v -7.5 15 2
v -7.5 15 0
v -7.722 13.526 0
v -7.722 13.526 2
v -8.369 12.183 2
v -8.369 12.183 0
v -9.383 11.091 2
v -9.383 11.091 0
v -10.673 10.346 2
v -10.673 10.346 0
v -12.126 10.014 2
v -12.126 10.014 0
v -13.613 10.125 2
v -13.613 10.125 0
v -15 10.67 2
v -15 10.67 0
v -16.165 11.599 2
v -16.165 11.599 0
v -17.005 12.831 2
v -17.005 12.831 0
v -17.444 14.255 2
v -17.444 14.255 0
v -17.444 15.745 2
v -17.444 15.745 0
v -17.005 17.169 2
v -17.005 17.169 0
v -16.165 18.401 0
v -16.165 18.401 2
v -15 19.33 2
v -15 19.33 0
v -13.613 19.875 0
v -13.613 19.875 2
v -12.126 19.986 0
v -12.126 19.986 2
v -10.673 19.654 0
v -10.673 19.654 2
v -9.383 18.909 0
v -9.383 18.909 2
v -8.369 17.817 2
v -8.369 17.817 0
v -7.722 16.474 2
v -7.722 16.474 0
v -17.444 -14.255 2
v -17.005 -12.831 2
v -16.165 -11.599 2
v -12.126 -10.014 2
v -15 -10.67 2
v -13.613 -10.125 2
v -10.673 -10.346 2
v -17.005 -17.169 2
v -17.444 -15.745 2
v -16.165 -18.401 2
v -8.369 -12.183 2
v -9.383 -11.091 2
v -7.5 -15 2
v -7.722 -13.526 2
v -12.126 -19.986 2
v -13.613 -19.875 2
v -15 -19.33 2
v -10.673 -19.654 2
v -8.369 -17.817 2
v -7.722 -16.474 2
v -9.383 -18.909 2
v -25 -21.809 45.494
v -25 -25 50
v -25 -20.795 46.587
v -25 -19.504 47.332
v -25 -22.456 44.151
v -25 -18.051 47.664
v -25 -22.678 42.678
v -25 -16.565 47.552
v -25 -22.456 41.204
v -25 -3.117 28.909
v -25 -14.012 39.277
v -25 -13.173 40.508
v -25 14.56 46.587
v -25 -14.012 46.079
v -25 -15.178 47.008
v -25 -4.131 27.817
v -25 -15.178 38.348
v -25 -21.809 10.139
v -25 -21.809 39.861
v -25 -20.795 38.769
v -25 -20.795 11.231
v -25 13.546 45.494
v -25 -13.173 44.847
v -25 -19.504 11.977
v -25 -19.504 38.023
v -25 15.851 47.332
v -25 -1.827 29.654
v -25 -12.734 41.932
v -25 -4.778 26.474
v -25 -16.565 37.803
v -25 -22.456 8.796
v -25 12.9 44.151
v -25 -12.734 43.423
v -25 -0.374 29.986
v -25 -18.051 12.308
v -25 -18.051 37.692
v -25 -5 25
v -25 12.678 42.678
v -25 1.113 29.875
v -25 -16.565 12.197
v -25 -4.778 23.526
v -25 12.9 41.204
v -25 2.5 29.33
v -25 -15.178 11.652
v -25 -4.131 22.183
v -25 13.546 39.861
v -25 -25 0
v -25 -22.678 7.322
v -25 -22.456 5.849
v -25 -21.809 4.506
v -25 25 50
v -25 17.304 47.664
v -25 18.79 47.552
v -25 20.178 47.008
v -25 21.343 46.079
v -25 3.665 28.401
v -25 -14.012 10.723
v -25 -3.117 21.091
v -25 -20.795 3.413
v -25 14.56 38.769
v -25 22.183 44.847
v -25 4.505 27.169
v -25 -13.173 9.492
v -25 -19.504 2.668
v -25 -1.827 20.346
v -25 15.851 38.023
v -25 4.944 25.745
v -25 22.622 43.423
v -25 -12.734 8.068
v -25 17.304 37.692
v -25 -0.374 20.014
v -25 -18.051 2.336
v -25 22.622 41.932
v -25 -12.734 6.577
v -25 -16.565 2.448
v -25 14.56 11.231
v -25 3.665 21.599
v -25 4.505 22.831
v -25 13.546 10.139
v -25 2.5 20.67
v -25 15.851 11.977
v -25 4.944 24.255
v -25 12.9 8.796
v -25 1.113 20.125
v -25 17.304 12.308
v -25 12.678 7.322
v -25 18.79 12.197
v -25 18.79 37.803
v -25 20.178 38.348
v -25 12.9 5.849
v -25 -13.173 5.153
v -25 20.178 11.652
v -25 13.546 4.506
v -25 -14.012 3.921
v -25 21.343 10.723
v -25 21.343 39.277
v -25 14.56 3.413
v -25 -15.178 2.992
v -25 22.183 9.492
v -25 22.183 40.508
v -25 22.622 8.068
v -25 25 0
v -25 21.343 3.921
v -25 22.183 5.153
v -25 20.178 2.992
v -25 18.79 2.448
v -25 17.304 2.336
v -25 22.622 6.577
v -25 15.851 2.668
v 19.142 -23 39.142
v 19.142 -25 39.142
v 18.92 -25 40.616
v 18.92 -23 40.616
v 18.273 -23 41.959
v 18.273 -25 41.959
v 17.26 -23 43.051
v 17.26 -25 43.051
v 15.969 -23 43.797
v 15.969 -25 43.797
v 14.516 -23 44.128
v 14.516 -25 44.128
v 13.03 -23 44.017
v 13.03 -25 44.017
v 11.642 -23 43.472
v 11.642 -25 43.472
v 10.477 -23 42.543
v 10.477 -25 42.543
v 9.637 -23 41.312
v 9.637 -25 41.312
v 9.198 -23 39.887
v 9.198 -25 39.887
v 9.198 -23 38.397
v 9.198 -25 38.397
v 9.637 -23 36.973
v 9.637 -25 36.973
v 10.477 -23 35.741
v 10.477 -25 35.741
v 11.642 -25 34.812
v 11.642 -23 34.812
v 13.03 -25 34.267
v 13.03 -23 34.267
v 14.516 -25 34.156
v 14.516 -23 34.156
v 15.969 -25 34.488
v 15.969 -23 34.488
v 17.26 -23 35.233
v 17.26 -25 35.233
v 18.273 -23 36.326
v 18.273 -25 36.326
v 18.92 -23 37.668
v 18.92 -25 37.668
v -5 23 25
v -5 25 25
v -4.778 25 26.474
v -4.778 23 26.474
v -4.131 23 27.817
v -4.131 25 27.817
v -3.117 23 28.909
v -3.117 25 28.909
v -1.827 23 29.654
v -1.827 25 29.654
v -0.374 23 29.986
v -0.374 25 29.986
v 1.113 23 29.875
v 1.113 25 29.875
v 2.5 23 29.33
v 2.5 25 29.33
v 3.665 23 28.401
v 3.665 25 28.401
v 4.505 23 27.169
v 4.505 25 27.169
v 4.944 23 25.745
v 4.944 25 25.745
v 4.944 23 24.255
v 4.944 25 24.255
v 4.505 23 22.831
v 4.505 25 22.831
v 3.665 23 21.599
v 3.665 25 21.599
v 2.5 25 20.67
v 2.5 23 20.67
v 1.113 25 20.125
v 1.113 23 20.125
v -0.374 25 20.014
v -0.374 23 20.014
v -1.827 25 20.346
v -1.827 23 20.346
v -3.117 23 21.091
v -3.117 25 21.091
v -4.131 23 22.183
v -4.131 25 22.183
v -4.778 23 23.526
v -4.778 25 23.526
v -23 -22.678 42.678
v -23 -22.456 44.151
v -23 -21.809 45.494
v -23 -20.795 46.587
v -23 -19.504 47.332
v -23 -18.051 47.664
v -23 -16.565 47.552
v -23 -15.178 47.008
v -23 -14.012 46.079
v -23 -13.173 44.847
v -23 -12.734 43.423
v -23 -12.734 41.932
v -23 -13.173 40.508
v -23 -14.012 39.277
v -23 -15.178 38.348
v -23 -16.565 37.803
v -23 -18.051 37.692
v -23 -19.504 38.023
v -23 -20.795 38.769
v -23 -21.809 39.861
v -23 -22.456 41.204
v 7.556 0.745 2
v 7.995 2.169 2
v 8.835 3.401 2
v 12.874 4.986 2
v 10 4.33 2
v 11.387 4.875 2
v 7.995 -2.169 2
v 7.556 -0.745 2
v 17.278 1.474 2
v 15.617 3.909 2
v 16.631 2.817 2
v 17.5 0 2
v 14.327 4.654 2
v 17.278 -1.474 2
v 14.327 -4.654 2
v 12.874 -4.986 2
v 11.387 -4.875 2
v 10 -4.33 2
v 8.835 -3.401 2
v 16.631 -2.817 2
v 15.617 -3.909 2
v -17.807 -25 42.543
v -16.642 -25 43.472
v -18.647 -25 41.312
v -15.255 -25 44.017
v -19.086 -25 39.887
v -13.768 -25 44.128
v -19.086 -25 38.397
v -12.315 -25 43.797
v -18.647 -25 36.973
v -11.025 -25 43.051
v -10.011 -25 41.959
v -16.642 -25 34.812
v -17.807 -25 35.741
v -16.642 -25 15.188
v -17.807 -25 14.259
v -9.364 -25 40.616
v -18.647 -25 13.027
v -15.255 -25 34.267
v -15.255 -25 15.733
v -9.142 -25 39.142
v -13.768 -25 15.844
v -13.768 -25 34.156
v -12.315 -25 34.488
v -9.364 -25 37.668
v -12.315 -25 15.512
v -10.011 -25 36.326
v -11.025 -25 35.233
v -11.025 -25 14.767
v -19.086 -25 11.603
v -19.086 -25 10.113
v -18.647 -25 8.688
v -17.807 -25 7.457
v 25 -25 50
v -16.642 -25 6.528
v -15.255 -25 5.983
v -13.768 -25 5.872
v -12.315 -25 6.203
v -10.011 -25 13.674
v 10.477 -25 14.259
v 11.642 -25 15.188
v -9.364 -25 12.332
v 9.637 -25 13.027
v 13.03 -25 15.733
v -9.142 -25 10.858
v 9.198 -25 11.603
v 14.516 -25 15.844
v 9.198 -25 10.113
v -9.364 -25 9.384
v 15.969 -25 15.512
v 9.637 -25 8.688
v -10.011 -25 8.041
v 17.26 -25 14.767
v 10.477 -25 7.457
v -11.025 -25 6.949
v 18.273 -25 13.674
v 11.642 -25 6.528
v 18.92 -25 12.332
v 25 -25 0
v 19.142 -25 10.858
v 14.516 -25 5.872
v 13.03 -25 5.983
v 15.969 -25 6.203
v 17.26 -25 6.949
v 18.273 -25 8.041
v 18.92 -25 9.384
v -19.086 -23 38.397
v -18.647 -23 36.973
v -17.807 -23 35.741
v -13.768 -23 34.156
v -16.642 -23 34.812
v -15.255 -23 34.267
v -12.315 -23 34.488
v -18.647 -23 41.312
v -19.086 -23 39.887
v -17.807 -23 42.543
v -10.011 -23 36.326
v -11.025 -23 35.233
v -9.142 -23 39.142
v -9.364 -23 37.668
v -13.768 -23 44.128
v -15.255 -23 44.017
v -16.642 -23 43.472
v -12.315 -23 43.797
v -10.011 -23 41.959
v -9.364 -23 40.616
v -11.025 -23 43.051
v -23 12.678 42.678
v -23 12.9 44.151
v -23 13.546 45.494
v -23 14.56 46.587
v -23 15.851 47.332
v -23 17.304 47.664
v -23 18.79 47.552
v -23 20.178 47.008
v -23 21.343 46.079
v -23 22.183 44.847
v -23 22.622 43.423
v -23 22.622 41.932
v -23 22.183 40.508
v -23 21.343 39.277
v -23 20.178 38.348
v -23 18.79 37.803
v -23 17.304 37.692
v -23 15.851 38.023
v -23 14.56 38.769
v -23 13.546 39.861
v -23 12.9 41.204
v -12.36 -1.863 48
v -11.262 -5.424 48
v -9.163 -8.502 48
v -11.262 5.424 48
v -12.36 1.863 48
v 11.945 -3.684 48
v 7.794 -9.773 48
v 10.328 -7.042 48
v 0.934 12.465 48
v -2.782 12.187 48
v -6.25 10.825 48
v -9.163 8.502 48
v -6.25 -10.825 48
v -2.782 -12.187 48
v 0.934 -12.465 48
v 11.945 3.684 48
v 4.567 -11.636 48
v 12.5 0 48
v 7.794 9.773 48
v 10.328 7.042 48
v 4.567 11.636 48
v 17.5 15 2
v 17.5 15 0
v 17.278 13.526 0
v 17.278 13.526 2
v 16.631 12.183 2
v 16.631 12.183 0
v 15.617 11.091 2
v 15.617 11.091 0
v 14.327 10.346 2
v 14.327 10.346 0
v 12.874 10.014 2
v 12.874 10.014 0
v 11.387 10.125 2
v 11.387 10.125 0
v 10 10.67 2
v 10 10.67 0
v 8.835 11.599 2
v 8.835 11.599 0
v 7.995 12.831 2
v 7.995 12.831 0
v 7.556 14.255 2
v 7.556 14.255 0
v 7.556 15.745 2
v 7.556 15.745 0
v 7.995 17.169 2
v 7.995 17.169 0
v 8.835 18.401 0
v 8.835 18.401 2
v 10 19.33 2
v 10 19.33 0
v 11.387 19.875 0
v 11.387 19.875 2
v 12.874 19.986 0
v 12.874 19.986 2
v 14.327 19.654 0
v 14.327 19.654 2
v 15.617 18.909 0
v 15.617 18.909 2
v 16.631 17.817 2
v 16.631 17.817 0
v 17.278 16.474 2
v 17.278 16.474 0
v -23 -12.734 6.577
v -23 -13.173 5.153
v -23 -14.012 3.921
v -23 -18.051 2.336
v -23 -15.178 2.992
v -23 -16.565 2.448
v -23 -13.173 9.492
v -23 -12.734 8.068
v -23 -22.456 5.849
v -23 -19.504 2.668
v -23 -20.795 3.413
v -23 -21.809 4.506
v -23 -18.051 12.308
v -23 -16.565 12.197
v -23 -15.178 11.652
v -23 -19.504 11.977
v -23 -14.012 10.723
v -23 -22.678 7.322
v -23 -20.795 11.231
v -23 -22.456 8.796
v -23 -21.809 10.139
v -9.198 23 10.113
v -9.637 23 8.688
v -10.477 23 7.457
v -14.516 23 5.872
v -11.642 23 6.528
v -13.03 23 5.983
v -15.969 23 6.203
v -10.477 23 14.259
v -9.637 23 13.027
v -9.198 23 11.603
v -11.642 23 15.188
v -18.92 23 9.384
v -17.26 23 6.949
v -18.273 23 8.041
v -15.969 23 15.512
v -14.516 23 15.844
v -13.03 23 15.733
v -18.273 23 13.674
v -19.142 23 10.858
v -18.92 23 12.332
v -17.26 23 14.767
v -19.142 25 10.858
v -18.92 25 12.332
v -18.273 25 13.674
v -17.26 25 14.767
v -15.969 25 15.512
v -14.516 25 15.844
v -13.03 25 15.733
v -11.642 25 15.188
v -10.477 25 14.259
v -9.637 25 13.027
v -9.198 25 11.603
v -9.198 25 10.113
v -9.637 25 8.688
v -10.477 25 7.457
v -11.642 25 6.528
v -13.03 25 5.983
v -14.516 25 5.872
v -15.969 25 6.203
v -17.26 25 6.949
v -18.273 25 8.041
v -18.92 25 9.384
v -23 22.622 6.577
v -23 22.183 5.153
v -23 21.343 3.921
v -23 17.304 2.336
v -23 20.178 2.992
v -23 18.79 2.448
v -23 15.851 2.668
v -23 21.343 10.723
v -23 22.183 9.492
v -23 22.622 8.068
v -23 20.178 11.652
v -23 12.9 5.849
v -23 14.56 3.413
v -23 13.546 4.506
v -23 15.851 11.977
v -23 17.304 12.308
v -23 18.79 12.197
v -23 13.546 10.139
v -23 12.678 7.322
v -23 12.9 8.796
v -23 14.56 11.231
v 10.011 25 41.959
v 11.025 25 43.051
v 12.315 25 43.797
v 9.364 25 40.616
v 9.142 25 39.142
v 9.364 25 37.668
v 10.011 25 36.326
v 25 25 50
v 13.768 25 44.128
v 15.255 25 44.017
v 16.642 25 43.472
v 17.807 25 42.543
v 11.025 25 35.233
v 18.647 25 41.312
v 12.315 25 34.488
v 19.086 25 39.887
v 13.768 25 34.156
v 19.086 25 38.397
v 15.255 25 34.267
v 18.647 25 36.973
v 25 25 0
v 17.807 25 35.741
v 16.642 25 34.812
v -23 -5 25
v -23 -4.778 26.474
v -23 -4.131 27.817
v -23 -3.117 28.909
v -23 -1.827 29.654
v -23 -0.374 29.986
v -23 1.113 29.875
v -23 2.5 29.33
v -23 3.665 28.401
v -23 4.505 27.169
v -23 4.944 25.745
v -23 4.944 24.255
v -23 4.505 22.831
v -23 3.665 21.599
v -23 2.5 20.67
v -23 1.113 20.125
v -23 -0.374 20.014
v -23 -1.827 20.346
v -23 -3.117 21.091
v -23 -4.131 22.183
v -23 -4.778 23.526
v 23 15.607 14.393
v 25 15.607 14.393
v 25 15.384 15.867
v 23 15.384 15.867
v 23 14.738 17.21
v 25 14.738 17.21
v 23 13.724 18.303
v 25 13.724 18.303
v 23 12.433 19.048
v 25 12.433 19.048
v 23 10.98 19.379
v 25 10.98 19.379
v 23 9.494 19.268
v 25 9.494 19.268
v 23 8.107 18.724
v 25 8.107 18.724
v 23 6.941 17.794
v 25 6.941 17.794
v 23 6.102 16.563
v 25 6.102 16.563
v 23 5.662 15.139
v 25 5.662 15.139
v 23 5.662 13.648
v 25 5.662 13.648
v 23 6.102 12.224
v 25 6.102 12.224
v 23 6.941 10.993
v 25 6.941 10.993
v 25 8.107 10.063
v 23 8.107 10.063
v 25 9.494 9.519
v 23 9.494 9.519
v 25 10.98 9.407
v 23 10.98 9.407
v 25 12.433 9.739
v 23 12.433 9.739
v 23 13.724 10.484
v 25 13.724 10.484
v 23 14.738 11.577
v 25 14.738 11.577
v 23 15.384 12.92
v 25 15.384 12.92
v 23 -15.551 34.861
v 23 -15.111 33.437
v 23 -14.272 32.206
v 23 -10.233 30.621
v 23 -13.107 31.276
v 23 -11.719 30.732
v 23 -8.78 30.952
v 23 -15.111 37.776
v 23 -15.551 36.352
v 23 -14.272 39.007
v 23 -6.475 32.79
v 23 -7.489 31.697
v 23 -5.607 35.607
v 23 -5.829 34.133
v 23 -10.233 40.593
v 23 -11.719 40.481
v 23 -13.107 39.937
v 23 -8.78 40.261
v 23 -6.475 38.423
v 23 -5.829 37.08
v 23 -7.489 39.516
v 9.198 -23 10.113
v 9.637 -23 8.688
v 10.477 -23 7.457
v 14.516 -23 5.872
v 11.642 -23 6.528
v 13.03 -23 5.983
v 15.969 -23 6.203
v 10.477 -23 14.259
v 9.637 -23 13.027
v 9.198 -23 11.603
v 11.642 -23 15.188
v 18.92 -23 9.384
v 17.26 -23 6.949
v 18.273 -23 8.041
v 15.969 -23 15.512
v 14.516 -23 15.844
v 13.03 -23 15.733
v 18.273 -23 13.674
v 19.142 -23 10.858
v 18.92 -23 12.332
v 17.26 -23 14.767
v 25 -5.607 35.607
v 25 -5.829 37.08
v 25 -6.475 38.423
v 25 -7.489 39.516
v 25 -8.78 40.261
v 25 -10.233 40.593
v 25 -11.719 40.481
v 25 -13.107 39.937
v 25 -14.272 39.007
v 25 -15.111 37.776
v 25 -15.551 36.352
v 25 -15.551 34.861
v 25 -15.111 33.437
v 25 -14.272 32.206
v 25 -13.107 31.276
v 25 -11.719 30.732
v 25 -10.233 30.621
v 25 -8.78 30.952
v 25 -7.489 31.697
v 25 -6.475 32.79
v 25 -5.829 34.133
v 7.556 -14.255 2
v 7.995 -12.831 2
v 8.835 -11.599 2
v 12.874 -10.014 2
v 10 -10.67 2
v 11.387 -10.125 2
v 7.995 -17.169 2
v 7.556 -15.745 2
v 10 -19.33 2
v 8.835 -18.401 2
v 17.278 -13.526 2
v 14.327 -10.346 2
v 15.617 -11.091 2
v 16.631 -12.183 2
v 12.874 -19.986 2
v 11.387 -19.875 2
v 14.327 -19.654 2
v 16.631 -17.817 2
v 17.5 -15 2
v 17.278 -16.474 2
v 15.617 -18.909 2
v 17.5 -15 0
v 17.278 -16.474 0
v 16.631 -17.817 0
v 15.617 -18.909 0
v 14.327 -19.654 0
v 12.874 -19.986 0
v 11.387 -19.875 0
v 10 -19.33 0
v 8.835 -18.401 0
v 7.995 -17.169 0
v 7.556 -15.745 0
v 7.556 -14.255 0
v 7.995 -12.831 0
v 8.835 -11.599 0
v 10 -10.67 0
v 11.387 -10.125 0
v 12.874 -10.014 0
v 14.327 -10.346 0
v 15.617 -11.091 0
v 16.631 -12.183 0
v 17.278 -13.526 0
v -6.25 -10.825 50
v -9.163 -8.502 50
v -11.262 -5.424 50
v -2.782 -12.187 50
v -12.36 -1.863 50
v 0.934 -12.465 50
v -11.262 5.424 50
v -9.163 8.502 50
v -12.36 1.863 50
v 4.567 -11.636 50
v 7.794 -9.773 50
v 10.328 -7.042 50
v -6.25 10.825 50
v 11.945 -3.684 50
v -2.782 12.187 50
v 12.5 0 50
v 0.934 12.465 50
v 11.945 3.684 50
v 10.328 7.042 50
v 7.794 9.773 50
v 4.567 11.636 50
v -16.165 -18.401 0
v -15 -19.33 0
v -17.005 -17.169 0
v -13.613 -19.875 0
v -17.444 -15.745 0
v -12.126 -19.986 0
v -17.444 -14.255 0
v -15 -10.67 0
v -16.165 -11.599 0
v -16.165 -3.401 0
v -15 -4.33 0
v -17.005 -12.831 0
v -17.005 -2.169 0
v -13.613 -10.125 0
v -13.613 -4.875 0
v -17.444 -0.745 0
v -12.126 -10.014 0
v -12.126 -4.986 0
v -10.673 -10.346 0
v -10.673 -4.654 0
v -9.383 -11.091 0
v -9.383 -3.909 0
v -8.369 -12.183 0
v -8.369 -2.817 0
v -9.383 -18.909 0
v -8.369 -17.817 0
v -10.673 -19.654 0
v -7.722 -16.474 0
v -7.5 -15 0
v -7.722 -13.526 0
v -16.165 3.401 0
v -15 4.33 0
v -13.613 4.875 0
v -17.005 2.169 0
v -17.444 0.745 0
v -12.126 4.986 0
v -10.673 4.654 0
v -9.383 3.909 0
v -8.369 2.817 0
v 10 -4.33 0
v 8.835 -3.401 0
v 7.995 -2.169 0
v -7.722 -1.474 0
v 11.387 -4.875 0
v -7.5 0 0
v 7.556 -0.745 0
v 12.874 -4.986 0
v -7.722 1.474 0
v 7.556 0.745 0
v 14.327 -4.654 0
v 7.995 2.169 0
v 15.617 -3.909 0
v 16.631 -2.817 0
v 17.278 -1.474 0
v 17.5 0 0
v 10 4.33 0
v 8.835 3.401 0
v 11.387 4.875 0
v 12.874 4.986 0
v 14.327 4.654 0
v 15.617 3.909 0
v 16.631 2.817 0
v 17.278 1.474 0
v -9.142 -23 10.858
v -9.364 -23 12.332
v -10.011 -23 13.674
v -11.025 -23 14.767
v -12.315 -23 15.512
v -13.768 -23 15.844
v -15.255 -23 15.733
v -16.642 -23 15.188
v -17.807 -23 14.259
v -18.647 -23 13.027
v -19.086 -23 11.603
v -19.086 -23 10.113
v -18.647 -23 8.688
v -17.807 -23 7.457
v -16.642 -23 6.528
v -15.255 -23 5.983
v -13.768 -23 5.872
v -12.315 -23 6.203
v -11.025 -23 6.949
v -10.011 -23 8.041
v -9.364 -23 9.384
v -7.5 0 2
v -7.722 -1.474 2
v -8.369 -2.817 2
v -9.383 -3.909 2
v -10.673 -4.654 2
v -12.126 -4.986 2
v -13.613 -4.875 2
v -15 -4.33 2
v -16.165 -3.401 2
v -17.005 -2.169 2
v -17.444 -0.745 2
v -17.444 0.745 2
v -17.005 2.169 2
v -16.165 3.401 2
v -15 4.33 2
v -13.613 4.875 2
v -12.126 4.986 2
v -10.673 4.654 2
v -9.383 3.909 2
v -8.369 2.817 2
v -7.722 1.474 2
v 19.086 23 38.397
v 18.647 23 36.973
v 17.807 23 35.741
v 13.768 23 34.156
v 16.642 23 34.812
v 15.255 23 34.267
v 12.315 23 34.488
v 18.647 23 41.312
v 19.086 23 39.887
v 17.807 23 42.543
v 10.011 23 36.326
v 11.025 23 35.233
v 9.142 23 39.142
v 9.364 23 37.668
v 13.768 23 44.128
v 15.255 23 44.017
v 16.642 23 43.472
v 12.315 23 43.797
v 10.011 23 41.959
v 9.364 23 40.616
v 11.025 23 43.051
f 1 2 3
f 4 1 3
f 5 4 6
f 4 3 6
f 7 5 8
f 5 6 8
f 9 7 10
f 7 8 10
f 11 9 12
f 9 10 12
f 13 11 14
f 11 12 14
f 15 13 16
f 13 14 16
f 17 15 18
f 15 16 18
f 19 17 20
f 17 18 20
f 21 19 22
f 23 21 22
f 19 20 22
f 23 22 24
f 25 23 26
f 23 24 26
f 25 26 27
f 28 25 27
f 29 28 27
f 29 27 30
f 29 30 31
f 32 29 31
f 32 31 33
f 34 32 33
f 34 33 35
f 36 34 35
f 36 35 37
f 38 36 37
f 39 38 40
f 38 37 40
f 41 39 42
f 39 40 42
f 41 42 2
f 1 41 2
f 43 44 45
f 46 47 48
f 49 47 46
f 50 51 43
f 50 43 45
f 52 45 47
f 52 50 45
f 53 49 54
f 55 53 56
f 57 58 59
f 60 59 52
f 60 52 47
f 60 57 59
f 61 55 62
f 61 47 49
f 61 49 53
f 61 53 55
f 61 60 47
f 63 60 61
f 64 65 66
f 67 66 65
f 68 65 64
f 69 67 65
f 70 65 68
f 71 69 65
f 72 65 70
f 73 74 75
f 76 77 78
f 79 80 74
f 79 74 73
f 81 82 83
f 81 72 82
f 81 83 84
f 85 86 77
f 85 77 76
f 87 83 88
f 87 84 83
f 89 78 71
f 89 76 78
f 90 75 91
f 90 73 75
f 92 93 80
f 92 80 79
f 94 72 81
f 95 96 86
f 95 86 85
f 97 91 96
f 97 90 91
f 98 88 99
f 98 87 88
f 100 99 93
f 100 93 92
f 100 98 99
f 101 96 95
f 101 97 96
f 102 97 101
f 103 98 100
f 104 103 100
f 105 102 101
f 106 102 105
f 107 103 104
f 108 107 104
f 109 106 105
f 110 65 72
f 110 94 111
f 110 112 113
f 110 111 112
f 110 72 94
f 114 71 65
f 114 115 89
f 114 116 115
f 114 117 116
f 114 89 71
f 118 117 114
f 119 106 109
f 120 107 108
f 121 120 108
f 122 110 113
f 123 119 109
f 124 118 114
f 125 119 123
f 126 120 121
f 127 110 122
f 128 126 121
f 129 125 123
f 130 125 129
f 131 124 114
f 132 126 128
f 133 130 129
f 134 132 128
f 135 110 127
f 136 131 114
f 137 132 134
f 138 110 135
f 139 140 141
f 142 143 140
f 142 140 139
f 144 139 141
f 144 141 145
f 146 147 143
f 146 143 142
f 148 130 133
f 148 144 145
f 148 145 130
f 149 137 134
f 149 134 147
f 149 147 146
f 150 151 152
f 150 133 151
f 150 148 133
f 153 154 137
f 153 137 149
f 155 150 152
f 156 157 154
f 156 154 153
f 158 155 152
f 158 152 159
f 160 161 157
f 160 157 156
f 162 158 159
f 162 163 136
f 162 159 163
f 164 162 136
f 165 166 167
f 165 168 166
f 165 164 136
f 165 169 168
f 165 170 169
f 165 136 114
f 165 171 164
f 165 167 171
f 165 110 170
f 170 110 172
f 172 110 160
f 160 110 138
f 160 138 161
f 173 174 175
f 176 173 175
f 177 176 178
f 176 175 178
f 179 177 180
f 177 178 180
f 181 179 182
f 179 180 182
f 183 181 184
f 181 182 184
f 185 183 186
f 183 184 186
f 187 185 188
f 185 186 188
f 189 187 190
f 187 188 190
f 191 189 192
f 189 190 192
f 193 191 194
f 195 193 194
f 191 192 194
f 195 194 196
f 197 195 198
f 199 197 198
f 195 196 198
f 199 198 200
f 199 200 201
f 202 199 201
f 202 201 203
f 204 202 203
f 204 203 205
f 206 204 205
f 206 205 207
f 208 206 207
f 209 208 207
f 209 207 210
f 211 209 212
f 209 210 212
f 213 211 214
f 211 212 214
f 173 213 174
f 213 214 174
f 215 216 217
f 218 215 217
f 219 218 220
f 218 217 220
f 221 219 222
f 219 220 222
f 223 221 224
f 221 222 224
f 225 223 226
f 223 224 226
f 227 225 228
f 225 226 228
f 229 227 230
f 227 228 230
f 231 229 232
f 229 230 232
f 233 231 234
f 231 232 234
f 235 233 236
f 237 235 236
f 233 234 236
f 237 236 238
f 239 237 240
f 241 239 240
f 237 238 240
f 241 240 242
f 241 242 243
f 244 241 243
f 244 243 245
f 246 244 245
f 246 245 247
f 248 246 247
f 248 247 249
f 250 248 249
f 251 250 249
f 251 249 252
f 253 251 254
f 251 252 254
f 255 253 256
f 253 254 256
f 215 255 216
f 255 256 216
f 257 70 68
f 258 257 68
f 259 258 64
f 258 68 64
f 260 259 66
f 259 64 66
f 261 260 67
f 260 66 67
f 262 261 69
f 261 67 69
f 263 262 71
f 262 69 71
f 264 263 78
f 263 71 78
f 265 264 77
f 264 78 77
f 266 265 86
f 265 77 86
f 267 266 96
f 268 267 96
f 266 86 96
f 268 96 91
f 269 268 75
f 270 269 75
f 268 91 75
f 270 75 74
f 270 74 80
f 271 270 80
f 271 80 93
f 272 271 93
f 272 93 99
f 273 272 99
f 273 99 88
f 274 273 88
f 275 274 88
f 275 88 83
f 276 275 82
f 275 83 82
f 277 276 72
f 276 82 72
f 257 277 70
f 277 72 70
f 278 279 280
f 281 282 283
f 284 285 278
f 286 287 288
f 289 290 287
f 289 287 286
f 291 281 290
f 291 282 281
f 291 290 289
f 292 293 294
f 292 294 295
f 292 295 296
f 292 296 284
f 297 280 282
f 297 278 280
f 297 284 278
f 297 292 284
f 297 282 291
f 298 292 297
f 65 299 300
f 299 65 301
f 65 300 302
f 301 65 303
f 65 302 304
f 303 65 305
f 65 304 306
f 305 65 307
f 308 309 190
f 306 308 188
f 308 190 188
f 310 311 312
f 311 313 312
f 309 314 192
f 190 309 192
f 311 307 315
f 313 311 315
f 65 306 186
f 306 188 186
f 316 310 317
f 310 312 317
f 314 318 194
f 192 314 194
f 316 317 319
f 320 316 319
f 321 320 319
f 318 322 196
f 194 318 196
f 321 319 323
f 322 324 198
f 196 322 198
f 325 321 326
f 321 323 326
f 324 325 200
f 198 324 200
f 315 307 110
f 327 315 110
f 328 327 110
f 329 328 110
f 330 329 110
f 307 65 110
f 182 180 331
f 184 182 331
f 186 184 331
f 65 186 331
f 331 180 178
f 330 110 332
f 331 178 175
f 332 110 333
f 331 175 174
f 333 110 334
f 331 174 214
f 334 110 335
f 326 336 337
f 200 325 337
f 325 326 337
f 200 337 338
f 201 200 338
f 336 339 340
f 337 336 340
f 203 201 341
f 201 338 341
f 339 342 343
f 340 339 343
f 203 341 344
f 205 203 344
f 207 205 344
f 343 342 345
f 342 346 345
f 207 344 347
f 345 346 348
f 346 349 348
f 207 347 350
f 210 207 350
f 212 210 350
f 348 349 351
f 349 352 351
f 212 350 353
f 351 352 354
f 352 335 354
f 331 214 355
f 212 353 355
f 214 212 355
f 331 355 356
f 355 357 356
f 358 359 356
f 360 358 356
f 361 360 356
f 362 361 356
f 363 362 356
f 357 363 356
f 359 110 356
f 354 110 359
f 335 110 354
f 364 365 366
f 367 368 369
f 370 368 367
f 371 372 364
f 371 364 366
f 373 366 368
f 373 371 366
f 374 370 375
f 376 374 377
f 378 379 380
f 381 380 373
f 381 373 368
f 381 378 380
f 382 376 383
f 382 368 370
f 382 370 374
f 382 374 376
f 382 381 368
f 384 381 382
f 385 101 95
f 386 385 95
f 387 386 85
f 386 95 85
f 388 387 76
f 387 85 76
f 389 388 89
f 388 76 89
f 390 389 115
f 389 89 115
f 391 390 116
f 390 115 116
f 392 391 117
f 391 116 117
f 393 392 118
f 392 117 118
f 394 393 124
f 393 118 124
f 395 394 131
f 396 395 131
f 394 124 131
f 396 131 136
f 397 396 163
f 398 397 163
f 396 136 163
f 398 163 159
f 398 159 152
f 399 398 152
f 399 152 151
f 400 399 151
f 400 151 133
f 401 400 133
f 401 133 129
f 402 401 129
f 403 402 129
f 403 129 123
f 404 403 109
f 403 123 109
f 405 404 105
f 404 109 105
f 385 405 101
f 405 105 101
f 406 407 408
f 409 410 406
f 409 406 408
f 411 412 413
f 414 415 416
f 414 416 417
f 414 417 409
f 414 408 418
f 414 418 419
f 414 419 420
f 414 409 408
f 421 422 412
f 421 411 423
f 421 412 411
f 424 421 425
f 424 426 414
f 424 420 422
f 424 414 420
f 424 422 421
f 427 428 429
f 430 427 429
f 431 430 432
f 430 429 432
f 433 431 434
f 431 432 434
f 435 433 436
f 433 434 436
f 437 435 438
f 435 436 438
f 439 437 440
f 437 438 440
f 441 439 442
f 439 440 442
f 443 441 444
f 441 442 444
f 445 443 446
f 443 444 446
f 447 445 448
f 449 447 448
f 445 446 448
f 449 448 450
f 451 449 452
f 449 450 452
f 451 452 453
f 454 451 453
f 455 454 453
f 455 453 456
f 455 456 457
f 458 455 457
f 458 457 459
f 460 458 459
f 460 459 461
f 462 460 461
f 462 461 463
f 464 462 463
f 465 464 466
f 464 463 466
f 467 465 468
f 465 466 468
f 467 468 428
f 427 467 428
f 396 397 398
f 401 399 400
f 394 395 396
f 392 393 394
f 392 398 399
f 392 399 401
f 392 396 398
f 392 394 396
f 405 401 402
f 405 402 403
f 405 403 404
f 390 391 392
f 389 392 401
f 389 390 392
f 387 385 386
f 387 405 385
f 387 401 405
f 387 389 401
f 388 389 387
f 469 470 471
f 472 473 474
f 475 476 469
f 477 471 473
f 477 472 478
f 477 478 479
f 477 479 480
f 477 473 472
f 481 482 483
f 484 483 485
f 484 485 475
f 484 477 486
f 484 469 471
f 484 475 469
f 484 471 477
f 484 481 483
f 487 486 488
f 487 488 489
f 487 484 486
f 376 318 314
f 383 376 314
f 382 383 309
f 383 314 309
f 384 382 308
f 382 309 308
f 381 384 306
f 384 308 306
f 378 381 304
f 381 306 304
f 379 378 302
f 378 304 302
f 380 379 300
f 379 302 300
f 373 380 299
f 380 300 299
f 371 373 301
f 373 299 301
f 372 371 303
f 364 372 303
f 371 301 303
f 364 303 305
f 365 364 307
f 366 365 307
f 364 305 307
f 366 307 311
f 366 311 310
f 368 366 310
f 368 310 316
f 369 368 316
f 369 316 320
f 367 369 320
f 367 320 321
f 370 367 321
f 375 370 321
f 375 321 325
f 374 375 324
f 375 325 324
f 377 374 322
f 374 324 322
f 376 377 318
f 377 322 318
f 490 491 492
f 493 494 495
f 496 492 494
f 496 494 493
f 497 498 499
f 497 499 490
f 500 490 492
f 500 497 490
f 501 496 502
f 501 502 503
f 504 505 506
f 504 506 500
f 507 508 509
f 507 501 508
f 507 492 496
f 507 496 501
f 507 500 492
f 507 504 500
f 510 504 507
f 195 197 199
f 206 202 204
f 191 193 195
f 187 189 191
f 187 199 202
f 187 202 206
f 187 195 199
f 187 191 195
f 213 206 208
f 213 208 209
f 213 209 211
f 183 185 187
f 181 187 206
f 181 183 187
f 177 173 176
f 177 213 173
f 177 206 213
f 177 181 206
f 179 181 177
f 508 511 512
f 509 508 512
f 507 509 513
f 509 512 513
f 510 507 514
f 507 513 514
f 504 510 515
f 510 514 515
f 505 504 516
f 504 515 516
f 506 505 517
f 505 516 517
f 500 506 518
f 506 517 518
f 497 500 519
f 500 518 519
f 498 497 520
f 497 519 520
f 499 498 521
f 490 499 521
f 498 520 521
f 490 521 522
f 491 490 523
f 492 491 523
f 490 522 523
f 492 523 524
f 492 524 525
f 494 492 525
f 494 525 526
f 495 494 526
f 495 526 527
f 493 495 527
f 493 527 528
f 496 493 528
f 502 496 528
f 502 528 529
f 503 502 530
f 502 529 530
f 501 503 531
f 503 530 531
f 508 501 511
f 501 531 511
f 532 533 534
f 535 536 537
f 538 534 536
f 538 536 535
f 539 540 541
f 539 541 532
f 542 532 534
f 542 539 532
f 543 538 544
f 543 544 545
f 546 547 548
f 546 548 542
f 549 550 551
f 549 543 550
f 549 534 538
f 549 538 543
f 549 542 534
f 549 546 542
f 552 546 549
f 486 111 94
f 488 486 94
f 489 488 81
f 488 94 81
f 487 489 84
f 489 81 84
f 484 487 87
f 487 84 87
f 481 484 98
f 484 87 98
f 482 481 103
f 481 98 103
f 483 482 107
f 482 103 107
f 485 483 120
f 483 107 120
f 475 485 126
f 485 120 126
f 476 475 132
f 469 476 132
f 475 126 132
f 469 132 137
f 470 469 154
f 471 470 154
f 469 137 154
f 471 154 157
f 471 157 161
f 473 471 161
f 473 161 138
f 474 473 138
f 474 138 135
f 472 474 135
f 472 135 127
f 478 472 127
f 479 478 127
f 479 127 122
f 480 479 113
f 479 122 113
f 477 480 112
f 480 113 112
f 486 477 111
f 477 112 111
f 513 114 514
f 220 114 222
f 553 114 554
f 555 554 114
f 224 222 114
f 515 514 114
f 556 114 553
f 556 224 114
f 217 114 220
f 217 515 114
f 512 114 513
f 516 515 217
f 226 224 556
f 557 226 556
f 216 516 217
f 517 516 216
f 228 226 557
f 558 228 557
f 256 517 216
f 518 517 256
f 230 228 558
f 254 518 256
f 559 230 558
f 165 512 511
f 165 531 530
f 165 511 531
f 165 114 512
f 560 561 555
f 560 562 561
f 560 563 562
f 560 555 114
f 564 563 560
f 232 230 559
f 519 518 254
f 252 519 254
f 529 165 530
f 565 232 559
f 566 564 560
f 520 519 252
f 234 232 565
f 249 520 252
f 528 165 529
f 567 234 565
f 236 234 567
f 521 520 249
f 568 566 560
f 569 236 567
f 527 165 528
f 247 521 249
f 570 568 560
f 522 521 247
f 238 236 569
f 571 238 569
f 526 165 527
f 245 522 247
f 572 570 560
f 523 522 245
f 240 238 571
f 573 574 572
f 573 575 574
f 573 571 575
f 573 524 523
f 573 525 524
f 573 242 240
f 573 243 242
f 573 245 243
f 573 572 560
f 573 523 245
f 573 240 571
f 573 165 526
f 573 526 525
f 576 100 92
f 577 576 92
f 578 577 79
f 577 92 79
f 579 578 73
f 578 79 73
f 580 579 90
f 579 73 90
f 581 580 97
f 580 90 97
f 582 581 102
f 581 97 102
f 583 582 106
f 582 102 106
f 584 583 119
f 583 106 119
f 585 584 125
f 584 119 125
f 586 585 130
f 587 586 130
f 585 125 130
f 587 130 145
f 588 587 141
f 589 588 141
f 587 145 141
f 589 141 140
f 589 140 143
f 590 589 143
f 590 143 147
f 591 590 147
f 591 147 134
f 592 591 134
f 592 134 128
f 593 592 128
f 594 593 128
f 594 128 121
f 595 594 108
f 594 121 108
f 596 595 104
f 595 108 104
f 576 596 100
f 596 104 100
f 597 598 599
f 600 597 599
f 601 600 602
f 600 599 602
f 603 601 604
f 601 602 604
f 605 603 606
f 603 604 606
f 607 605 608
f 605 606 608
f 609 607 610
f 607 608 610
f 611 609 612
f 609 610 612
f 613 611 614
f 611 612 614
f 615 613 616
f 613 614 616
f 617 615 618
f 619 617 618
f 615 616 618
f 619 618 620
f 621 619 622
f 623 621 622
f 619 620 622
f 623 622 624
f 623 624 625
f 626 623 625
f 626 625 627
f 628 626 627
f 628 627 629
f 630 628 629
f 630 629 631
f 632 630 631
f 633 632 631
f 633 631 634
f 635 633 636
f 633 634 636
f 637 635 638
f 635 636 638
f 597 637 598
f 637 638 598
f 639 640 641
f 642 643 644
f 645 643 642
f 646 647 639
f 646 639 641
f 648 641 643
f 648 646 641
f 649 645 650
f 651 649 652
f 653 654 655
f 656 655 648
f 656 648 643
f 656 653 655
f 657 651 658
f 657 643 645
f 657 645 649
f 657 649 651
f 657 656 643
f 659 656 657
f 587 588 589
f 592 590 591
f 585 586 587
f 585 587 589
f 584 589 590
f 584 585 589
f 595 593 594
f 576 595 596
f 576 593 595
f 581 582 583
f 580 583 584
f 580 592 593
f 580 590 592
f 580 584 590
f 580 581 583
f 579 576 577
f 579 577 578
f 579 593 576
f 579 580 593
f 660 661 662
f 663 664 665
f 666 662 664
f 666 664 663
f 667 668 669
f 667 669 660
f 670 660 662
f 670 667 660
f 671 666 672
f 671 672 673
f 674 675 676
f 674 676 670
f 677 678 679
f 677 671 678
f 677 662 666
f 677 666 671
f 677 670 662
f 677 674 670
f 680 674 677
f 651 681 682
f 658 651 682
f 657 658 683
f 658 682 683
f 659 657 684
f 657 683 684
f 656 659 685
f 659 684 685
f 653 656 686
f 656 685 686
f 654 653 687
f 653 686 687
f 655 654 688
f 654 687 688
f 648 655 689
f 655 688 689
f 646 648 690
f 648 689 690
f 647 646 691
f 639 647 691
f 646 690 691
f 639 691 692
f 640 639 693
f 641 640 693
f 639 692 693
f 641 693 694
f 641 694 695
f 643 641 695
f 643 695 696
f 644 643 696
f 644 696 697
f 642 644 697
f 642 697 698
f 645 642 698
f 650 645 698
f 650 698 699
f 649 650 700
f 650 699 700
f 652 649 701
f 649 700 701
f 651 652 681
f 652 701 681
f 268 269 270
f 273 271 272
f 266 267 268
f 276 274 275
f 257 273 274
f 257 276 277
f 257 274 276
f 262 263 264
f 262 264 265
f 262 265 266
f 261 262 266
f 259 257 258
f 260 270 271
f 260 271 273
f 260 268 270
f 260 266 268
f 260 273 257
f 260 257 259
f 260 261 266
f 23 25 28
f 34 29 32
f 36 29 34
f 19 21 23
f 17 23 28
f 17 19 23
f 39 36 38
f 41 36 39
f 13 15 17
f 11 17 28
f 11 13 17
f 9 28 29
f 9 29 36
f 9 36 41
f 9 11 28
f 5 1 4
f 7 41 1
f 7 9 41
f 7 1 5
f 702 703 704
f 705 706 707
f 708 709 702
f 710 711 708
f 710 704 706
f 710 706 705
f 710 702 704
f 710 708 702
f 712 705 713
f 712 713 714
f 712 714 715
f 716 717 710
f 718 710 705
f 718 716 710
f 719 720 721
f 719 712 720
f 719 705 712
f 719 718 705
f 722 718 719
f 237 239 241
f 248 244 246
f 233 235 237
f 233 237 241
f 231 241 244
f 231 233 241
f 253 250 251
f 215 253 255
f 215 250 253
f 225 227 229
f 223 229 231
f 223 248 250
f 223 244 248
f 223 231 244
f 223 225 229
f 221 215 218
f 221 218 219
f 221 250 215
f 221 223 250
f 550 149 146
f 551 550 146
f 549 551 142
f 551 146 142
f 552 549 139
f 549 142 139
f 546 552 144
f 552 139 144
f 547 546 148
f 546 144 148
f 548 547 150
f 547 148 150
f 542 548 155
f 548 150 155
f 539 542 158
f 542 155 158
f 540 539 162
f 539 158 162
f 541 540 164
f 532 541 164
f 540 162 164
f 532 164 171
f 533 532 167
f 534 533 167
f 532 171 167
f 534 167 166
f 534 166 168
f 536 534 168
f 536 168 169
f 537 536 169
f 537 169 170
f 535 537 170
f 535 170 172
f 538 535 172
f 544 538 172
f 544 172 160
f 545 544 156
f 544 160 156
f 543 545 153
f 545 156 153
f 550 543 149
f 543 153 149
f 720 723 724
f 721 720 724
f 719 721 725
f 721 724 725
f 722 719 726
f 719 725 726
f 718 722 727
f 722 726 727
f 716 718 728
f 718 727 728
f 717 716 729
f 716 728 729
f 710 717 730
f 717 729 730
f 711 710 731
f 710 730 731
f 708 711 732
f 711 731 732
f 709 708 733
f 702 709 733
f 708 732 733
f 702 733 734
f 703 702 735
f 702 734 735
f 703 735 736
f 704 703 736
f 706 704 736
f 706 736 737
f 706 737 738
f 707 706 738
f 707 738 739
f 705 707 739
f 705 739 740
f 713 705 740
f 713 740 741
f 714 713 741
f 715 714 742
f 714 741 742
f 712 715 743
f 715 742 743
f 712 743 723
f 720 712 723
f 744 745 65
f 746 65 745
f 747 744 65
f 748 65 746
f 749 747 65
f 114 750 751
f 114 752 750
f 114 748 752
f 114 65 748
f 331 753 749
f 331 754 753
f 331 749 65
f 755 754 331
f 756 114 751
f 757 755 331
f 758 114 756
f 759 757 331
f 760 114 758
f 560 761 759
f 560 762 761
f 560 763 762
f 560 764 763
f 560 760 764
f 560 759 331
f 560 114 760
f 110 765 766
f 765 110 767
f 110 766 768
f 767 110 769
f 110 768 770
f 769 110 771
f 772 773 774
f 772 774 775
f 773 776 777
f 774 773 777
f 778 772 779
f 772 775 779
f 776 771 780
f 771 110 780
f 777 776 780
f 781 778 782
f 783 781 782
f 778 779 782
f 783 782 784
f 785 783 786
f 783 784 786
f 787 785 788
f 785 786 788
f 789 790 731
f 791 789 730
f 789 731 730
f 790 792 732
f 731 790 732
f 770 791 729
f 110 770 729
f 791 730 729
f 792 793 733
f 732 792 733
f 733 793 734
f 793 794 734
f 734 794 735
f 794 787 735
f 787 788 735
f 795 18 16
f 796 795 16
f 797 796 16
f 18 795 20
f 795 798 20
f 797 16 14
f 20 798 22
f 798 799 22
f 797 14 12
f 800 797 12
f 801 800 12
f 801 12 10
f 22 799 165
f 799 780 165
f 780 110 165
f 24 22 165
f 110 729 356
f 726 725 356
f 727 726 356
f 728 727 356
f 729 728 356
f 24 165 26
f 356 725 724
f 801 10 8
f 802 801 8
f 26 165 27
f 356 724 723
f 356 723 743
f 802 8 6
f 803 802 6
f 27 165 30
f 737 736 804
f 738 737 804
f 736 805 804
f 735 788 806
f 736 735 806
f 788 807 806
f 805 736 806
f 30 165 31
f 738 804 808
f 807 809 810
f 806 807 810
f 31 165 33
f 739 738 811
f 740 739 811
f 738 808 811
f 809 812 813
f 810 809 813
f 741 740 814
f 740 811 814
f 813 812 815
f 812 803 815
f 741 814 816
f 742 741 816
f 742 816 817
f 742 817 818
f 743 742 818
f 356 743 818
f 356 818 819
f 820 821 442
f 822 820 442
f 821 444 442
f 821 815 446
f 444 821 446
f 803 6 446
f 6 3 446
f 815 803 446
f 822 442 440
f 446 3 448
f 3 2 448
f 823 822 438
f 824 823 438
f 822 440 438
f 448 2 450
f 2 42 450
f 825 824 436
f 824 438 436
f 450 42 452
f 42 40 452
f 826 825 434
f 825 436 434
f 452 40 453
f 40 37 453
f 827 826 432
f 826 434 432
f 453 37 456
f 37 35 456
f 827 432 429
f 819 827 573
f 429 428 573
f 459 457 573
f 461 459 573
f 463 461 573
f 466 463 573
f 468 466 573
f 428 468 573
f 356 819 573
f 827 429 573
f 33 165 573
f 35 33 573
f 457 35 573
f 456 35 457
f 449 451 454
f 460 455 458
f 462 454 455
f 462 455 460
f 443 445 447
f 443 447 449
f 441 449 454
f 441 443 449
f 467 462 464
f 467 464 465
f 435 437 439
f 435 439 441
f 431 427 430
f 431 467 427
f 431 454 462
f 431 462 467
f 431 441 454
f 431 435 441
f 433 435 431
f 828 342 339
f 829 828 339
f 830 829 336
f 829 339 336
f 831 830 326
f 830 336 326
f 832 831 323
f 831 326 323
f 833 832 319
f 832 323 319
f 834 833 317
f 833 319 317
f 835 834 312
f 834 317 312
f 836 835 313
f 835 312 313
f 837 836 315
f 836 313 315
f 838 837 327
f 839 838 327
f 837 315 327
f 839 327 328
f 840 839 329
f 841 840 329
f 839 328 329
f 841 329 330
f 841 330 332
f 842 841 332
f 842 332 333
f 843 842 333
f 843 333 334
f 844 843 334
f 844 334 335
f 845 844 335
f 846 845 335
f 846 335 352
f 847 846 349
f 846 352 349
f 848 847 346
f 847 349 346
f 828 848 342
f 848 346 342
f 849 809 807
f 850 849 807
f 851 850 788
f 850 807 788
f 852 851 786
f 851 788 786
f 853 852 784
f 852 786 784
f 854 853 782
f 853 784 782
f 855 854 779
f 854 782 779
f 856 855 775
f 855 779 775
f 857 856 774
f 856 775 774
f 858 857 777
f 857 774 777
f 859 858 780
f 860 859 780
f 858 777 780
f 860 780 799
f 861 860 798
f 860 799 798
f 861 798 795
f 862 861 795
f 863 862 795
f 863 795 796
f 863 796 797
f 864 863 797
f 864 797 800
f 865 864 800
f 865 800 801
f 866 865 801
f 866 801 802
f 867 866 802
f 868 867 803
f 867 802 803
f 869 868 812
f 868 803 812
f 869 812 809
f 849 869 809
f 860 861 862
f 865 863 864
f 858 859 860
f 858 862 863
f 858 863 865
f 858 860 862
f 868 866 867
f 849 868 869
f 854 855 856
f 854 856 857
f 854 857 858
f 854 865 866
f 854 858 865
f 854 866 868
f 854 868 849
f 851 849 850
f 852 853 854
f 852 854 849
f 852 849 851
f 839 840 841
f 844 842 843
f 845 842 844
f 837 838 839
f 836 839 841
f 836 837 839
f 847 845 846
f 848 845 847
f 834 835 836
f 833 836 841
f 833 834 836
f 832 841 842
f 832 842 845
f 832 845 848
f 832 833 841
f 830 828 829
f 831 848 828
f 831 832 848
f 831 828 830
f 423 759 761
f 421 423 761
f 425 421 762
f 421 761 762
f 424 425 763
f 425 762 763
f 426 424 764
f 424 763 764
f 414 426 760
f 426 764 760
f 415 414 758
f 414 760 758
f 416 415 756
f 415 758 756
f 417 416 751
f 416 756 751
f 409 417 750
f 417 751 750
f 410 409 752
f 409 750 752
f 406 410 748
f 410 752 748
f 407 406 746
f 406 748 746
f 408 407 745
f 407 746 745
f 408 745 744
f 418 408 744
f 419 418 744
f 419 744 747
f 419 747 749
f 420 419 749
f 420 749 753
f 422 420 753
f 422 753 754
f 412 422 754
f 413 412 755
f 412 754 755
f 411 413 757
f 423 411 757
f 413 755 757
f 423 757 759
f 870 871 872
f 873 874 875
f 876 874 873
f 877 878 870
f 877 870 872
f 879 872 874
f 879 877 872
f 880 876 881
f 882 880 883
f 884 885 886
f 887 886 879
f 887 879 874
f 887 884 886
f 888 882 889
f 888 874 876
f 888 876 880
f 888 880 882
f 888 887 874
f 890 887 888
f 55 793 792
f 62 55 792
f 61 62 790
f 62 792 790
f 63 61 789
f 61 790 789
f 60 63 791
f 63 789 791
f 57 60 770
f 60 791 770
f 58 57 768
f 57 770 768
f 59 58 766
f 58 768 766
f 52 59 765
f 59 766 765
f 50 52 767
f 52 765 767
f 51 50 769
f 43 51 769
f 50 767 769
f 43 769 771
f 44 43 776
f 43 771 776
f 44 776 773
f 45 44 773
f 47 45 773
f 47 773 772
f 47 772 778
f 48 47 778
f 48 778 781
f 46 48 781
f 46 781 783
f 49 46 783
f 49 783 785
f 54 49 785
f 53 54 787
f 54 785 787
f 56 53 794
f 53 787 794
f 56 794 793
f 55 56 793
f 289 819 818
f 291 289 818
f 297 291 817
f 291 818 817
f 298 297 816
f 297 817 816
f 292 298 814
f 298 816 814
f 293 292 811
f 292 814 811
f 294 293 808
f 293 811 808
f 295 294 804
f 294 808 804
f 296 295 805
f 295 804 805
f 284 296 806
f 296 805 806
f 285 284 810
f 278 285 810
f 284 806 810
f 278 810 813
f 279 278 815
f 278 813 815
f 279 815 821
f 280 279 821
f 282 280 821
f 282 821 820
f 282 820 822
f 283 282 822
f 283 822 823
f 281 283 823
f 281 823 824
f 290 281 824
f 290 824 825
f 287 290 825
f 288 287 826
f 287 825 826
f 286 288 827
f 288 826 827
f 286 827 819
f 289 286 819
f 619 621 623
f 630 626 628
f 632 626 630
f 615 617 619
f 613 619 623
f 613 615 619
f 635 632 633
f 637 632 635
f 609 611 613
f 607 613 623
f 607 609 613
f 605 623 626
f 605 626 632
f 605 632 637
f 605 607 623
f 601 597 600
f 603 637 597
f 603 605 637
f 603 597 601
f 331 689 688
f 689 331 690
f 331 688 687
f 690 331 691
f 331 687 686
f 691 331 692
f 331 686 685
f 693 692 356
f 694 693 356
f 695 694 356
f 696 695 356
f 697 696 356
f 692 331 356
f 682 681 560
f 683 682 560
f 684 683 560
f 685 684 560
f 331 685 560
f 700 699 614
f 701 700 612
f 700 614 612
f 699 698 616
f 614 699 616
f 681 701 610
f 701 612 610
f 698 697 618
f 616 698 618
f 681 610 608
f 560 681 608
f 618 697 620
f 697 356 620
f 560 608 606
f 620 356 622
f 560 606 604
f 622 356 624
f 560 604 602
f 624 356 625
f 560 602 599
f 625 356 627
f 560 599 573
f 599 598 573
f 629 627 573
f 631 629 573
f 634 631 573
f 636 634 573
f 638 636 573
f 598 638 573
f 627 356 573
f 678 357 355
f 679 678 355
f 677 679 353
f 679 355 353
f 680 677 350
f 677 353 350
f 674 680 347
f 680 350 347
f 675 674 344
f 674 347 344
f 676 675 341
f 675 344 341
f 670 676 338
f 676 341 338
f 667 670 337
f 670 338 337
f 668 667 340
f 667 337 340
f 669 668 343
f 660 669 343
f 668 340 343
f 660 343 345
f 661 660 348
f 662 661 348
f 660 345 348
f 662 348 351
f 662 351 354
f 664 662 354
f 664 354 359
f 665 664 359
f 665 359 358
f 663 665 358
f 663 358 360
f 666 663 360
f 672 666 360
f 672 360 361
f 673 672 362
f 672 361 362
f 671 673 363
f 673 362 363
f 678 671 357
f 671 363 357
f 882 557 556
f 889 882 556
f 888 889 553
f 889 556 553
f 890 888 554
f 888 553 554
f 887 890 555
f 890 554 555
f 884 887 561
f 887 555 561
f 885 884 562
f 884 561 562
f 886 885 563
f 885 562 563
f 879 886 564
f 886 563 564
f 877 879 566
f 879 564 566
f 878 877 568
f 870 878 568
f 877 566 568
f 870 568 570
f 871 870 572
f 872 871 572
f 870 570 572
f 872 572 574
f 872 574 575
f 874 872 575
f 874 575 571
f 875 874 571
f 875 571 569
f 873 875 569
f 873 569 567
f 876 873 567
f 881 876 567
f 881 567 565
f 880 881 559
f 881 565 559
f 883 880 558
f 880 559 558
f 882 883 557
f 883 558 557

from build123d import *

# Parameters (mm, degrees)
F0_W      = 50
F0_H      = 50
F1_DEPTH  = 50
F2_R      = 12.5
F3_DEPTH  = 2
F4_R      = 5
F5_DEPTH  = 2
F6_R      = 5
F7_DEPTH  = 2
F8_R      = 5
F9_DEPTH  = 2
F10_R     = 5
F11_DEPTH = 2
F12_R     = 5
F13_DEPTH = 2


with BuildPart() as f1:
    # F0 (on Top) → F1 (new body)
    with BuildSketch(Plane.XY):
        Rectangle(F0_W, F0_H)
    extrude(amount=F1_DEPTH)

    # F2 (on face) → F3 (cut)
    with BuildSketch(Plane.XY.offset(50)):
        Circle(F2_R)
    extrude(amount=-F3_DEPTH, mode=Mode.SUBTRACT)

    # F4 (on face) → F5 (cut)
    with BuildSketch(Plane.YZ.offset(25)):
        with Locations((-10.606602, 35.606602)):
            Circle(F4_R)
        with Locations((10.606602, 14.393398)):
            Circle(F4_R)
    extrude(amount=-F5_DEPTH, mode=Mode.SUBTRACT)

    # F6 (on face) → F7 (cut)
    with BuildSketch(Plane(origin=(0, 25, 0), x_dir=(-1, 0, 0), z_dir=(0, 1, 0))):
        with Locations((0, 25)):
            Circle(F6_R)
        with Locations((-14.142136, 39.142136)):
            Circle(F6_R)
        with Locations((14.142136, 10.857864)):
            Circle(F6_R)
    extrude(amount=-F7_DEPTH, mode=Mode.SUBTRACT)

    # F8 (on face) → F9 (cut)
    with BuildSketch(Plane.XZ.offset(25)):
        with Locations((14.142136, 39.142136)):
            Circle(F8_R)
        with Locations((-14.142136, 39.142136)):
            Circle(F8_R)
        with Locations((-14.142136, 10.857864)):
            Circle(F8_R)
        with Locations((14.142136, 10.857864)):
            Circle(F8_R)
    extrude(amount=-F9_DEPTH, mode=Mode.SUBTRACT)

    # F10 (on face) → F11 (cut)
    with BuildSketch(Plane(origin=(-25, 0, 0), x_dir=(0, -1, 0), z_dir=(-1, 0, 0))):
        with Locations((-17.67767, 42.67767)):
            Circle(F10_R)
        with Locations((0, 25)):
            Circle(F10_R)
        with Locations((-17.67767, 7.32233)):
            Circle(F10_R)
        with Locations((17.67767, 7.32233)):
            Circle(F10_R)
        with Locations((17.67767, 42.67767)):
            Circle(F10_R)
    extrude(amount=-F11_DEPTH, mode=Mode.SUBTRACT)

    # F12 (on face) → F13 (cut)
    with BuildSketch(Plane(origin=(0, 0, 0), x_dir=(1, 0, 0), z_dir=(0, 0, -1))):
        with Locations((-12.5, 15)):
            Circle(F12_R)
        with Locations((-12.5, 0)):
            Circle(F12_R)
        with Locations((-12.5, -15)):
            Circle(F12_R)
        with Locations((12.5, -15)):
            Circle(F12_R)
        with Locations((12.5, 0)):
            Circle(F12_R)
        with Locations((12.5, 15)):
            Circle(F12_R)
    extrude(amount=-F13_DEPTH, mode=Mode.SUBTRACT)


solid = f1.part
